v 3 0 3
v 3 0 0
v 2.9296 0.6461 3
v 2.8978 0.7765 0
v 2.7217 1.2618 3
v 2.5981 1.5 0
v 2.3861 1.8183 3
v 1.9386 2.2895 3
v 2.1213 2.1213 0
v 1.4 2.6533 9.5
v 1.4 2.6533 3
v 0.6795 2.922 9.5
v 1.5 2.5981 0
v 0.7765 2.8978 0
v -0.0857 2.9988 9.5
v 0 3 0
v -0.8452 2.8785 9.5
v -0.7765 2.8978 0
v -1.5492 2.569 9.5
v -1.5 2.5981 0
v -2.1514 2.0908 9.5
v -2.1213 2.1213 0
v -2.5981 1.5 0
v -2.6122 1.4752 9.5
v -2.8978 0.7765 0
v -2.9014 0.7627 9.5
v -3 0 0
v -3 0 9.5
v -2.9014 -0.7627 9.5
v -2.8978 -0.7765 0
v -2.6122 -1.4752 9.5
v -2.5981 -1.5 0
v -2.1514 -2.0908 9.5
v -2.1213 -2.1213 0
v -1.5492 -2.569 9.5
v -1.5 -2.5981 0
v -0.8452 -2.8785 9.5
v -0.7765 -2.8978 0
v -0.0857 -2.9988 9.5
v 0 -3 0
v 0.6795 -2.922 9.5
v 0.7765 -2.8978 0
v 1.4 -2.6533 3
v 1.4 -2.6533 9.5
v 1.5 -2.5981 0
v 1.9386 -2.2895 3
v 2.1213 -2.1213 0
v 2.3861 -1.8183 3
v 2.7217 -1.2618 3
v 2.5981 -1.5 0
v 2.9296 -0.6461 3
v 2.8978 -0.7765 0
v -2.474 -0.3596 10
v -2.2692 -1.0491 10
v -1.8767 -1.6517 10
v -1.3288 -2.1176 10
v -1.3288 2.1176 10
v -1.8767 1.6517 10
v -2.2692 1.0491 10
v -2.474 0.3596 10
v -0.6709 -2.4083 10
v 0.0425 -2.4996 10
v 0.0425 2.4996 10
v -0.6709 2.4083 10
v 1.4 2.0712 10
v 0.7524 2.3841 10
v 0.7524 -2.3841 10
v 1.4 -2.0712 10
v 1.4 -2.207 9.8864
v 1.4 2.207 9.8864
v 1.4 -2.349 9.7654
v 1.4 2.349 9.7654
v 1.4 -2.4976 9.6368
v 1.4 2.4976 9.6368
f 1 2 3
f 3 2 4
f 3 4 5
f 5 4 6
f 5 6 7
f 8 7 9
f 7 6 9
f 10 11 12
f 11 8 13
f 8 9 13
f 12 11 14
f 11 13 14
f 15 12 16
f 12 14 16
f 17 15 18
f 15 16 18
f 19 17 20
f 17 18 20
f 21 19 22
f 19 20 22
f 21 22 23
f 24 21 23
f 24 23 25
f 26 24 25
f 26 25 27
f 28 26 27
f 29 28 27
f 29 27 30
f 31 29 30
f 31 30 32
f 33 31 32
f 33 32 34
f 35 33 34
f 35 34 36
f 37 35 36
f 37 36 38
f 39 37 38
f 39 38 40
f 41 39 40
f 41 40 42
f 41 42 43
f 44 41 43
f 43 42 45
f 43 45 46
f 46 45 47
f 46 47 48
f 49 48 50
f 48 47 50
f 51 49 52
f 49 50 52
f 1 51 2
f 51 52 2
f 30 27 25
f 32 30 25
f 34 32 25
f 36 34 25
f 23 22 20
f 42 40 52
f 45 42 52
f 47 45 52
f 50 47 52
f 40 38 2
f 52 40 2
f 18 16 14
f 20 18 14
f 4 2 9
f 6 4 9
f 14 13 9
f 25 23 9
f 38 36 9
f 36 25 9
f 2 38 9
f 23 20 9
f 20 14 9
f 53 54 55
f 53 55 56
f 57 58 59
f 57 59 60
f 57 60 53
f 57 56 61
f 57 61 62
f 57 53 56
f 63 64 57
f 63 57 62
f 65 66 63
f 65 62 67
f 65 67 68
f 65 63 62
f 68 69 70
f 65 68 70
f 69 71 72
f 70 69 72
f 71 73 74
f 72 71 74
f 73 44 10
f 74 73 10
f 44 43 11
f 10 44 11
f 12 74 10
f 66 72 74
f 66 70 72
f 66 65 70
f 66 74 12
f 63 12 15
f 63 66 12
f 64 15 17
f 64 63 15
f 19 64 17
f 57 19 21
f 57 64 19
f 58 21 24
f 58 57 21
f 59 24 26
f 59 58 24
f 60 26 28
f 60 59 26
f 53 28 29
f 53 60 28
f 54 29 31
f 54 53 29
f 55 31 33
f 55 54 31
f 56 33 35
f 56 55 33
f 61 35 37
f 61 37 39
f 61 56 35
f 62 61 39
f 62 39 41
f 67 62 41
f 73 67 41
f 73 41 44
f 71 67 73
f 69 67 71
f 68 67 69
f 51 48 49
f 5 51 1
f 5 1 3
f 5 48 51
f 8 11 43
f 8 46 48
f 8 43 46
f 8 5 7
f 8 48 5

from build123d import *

# Parameters (mm, degrees)
BOX009_W          = 6
BOX009_H          = 6
BOX009_DEPTH      = 7
CYLINDER001_R     = 3
CYLINDER001_DEPTH = 10
CHAMFER002_SIZE   = 0.5


with BuildPart() as rotary_top_cutout:
    # Box009 → Box009 (new body)
    with BuildSketch(Plane(origin=(1.4, -3, 3), x_dir=(1, 0, 0), z_dir=(0, 0, 1))):
        with Locations((3, 3)):
            Rectangle(BOX009_W, BOX009_H)
    extrude(amount=BOX009_DEPTH)


with BuildPart() as chamfer002:
    # Cylinder001 → Cylinder001 (new body)
    with BuildSketch(Plane.XY):
        Circle(CYLINDER001_R)
    extrude(amount=CYLINDER001_DEPTH)

    # Cut017: cut ROTARY_top_cutout
    add(rotary_top_cutout.part, mode=Mode.SUBTRACT)

    # Chamfer002
    chamfer002_edges = [chamfer002.edges().sort_by_distance(p)[0] for p in [
        (-3, 0, 10),
    ]]
    chamfer(chamfer002_edges, length=CHAMFER002_SIZE)


solid = chamfer002.part
